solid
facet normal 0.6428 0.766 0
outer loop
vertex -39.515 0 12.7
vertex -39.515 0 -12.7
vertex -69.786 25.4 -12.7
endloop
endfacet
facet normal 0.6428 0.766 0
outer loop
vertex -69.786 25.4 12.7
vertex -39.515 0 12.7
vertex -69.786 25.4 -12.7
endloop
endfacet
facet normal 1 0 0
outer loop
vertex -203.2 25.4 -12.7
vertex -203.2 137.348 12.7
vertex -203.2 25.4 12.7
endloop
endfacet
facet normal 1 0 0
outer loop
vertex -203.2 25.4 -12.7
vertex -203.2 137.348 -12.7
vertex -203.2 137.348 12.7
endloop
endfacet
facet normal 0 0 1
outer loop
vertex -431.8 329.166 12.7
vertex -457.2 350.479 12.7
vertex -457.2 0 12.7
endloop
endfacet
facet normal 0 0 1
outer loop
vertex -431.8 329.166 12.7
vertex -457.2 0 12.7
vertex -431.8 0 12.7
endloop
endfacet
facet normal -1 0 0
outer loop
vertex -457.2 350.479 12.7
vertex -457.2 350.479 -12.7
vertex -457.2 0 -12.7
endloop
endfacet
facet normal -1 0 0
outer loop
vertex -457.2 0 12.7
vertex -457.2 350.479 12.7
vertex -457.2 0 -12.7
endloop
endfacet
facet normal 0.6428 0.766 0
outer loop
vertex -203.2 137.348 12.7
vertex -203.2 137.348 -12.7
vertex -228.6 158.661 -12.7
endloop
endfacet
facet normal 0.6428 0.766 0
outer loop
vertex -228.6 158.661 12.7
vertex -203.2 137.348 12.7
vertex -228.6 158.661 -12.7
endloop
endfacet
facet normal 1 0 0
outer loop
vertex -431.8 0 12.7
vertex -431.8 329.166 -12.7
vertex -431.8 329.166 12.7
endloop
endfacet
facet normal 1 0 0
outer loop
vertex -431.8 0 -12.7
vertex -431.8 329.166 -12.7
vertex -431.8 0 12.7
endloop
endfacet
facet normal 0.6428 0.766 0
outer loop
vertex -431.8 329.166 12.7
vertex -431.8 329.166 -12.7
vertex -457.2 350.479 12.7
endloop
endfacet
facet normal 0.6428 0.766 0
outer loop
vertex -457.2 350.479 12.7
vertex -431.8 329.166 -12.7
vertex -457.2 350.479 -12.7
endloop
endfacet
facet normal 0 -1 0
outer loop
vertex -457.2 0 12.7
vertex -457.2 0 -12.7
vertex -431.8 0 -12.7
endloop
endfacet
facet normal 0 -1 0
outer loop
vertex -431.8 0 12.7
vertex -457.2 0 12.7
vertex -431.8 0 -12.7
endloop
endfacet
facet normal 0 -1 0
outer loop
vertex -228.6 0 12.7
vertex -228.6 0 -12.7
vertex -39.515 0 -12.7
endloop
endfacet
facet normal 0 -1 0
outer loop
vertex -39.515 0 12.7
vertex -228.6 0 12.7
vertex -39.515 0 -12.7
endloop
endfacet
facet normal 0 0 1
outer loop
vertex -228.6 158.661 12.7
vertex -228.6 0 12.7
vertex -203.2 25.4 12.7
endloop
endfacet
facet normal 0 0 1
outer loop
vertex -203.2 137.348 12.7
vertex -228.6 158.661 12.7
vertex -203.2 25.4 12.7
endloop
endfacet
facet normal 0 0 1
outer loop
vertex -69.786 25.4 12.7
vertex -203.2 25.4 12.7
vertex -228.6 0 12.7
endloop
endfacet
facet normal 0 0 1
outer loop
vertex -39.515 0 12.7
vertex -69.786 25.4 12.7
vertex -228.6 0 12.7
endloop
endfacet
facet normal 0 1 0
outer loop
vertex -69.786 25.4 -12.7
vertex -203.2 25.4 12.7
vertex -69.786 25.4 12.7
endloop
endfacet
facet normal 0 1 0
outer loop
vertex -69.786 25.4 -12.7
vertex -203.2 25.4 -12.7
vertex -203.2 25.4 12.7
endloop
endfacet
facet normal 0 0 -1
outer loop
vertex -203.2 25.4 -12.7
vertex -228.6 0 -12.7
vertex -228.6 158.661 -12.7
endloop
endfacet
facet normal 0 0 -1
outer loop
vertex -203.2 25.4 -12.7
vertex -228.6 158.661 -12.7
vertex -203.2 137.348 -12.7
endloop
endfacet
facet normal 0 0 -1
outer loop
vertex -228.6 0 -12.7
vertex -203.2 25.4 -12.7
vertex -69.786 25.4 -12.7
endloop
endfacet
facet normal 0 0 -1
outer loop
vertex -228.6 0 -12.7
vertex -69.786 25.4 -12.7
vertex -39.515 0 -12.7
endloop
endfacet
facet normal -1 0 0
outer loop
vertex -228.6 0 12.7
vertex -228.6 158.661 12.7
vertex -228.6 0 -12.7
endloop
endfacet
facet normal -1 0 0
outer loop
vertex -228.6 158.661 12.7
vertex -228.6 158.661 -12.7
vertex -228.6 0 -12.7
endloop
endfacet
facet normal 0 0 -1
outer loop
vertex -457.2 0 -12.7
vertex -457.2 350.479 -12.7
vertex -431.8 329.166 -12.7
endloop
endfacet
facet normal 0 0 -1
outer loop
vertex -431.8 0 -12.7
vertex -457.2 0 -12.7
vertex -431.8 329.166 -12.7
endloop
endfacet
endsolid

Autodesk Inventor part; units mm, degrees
ref_plane "YZ Plane" through (0, 0, 0) normal (1, 0, 0) x (0, 1, 0)
ref_plane "XZ Plane" through (0, 0, 0) normal (0, 1, 0) x (-1, 0, 0)
ref_plane "XY Plane" through (0, 0, 0) normal (0, 0, 1) x (1, 0, 0)
sketch "Sketch1" plane through (0, 0, 0) normal (0, 0, 1) x (1, 0, 0)
  line L0 (0, 0) -> (-228.6, 0) construction
  line L1 (0, 0) -> (-39.5154, 0)
  line L2 (-457.2, 350.479) -> (-457.2, 0)
  line L3 (-431.8, 329.1659) -> (-431.8, 0)
  line L4 (-228.6, 158.6608) -> (-228.6, 0)
  line L5 (-203.2, 137.3477) -> (-203.2, 0)
  line L6 (-457.2, 0) -> (-431.8, 0)
  line L7 (-228.6, 0) -> (-203.2, 0)
  line L8 (-203.2, 0) -> (-39.5154, 0)
  line L9 (-203.2, 25.4) -> (-69.7859, 25.4)
  line L10 (0, 0) -> (0, 391.6762) construction
  line L11 (-431.8, 329.1659) -> (-457.2, 350.479)
  line L12 (-39.5154, 0) -> (-69.7859, 25.4)
  line L13 (-203.2, 137.3477) -> (-228.6, 158.6608)
  dimension "d19" = 25.4
  dimension "d21" = 25.4
  dimension "d27" = 25.4
  dimension "d34" = 350.479
  dimension "d35" = 158.6608
  dimension "d36" = 163.6846
extrude "Extrusion1" add sketch "Sketch1" along normal mid plane 25.4
properties part number "newFrame1x1V03"
